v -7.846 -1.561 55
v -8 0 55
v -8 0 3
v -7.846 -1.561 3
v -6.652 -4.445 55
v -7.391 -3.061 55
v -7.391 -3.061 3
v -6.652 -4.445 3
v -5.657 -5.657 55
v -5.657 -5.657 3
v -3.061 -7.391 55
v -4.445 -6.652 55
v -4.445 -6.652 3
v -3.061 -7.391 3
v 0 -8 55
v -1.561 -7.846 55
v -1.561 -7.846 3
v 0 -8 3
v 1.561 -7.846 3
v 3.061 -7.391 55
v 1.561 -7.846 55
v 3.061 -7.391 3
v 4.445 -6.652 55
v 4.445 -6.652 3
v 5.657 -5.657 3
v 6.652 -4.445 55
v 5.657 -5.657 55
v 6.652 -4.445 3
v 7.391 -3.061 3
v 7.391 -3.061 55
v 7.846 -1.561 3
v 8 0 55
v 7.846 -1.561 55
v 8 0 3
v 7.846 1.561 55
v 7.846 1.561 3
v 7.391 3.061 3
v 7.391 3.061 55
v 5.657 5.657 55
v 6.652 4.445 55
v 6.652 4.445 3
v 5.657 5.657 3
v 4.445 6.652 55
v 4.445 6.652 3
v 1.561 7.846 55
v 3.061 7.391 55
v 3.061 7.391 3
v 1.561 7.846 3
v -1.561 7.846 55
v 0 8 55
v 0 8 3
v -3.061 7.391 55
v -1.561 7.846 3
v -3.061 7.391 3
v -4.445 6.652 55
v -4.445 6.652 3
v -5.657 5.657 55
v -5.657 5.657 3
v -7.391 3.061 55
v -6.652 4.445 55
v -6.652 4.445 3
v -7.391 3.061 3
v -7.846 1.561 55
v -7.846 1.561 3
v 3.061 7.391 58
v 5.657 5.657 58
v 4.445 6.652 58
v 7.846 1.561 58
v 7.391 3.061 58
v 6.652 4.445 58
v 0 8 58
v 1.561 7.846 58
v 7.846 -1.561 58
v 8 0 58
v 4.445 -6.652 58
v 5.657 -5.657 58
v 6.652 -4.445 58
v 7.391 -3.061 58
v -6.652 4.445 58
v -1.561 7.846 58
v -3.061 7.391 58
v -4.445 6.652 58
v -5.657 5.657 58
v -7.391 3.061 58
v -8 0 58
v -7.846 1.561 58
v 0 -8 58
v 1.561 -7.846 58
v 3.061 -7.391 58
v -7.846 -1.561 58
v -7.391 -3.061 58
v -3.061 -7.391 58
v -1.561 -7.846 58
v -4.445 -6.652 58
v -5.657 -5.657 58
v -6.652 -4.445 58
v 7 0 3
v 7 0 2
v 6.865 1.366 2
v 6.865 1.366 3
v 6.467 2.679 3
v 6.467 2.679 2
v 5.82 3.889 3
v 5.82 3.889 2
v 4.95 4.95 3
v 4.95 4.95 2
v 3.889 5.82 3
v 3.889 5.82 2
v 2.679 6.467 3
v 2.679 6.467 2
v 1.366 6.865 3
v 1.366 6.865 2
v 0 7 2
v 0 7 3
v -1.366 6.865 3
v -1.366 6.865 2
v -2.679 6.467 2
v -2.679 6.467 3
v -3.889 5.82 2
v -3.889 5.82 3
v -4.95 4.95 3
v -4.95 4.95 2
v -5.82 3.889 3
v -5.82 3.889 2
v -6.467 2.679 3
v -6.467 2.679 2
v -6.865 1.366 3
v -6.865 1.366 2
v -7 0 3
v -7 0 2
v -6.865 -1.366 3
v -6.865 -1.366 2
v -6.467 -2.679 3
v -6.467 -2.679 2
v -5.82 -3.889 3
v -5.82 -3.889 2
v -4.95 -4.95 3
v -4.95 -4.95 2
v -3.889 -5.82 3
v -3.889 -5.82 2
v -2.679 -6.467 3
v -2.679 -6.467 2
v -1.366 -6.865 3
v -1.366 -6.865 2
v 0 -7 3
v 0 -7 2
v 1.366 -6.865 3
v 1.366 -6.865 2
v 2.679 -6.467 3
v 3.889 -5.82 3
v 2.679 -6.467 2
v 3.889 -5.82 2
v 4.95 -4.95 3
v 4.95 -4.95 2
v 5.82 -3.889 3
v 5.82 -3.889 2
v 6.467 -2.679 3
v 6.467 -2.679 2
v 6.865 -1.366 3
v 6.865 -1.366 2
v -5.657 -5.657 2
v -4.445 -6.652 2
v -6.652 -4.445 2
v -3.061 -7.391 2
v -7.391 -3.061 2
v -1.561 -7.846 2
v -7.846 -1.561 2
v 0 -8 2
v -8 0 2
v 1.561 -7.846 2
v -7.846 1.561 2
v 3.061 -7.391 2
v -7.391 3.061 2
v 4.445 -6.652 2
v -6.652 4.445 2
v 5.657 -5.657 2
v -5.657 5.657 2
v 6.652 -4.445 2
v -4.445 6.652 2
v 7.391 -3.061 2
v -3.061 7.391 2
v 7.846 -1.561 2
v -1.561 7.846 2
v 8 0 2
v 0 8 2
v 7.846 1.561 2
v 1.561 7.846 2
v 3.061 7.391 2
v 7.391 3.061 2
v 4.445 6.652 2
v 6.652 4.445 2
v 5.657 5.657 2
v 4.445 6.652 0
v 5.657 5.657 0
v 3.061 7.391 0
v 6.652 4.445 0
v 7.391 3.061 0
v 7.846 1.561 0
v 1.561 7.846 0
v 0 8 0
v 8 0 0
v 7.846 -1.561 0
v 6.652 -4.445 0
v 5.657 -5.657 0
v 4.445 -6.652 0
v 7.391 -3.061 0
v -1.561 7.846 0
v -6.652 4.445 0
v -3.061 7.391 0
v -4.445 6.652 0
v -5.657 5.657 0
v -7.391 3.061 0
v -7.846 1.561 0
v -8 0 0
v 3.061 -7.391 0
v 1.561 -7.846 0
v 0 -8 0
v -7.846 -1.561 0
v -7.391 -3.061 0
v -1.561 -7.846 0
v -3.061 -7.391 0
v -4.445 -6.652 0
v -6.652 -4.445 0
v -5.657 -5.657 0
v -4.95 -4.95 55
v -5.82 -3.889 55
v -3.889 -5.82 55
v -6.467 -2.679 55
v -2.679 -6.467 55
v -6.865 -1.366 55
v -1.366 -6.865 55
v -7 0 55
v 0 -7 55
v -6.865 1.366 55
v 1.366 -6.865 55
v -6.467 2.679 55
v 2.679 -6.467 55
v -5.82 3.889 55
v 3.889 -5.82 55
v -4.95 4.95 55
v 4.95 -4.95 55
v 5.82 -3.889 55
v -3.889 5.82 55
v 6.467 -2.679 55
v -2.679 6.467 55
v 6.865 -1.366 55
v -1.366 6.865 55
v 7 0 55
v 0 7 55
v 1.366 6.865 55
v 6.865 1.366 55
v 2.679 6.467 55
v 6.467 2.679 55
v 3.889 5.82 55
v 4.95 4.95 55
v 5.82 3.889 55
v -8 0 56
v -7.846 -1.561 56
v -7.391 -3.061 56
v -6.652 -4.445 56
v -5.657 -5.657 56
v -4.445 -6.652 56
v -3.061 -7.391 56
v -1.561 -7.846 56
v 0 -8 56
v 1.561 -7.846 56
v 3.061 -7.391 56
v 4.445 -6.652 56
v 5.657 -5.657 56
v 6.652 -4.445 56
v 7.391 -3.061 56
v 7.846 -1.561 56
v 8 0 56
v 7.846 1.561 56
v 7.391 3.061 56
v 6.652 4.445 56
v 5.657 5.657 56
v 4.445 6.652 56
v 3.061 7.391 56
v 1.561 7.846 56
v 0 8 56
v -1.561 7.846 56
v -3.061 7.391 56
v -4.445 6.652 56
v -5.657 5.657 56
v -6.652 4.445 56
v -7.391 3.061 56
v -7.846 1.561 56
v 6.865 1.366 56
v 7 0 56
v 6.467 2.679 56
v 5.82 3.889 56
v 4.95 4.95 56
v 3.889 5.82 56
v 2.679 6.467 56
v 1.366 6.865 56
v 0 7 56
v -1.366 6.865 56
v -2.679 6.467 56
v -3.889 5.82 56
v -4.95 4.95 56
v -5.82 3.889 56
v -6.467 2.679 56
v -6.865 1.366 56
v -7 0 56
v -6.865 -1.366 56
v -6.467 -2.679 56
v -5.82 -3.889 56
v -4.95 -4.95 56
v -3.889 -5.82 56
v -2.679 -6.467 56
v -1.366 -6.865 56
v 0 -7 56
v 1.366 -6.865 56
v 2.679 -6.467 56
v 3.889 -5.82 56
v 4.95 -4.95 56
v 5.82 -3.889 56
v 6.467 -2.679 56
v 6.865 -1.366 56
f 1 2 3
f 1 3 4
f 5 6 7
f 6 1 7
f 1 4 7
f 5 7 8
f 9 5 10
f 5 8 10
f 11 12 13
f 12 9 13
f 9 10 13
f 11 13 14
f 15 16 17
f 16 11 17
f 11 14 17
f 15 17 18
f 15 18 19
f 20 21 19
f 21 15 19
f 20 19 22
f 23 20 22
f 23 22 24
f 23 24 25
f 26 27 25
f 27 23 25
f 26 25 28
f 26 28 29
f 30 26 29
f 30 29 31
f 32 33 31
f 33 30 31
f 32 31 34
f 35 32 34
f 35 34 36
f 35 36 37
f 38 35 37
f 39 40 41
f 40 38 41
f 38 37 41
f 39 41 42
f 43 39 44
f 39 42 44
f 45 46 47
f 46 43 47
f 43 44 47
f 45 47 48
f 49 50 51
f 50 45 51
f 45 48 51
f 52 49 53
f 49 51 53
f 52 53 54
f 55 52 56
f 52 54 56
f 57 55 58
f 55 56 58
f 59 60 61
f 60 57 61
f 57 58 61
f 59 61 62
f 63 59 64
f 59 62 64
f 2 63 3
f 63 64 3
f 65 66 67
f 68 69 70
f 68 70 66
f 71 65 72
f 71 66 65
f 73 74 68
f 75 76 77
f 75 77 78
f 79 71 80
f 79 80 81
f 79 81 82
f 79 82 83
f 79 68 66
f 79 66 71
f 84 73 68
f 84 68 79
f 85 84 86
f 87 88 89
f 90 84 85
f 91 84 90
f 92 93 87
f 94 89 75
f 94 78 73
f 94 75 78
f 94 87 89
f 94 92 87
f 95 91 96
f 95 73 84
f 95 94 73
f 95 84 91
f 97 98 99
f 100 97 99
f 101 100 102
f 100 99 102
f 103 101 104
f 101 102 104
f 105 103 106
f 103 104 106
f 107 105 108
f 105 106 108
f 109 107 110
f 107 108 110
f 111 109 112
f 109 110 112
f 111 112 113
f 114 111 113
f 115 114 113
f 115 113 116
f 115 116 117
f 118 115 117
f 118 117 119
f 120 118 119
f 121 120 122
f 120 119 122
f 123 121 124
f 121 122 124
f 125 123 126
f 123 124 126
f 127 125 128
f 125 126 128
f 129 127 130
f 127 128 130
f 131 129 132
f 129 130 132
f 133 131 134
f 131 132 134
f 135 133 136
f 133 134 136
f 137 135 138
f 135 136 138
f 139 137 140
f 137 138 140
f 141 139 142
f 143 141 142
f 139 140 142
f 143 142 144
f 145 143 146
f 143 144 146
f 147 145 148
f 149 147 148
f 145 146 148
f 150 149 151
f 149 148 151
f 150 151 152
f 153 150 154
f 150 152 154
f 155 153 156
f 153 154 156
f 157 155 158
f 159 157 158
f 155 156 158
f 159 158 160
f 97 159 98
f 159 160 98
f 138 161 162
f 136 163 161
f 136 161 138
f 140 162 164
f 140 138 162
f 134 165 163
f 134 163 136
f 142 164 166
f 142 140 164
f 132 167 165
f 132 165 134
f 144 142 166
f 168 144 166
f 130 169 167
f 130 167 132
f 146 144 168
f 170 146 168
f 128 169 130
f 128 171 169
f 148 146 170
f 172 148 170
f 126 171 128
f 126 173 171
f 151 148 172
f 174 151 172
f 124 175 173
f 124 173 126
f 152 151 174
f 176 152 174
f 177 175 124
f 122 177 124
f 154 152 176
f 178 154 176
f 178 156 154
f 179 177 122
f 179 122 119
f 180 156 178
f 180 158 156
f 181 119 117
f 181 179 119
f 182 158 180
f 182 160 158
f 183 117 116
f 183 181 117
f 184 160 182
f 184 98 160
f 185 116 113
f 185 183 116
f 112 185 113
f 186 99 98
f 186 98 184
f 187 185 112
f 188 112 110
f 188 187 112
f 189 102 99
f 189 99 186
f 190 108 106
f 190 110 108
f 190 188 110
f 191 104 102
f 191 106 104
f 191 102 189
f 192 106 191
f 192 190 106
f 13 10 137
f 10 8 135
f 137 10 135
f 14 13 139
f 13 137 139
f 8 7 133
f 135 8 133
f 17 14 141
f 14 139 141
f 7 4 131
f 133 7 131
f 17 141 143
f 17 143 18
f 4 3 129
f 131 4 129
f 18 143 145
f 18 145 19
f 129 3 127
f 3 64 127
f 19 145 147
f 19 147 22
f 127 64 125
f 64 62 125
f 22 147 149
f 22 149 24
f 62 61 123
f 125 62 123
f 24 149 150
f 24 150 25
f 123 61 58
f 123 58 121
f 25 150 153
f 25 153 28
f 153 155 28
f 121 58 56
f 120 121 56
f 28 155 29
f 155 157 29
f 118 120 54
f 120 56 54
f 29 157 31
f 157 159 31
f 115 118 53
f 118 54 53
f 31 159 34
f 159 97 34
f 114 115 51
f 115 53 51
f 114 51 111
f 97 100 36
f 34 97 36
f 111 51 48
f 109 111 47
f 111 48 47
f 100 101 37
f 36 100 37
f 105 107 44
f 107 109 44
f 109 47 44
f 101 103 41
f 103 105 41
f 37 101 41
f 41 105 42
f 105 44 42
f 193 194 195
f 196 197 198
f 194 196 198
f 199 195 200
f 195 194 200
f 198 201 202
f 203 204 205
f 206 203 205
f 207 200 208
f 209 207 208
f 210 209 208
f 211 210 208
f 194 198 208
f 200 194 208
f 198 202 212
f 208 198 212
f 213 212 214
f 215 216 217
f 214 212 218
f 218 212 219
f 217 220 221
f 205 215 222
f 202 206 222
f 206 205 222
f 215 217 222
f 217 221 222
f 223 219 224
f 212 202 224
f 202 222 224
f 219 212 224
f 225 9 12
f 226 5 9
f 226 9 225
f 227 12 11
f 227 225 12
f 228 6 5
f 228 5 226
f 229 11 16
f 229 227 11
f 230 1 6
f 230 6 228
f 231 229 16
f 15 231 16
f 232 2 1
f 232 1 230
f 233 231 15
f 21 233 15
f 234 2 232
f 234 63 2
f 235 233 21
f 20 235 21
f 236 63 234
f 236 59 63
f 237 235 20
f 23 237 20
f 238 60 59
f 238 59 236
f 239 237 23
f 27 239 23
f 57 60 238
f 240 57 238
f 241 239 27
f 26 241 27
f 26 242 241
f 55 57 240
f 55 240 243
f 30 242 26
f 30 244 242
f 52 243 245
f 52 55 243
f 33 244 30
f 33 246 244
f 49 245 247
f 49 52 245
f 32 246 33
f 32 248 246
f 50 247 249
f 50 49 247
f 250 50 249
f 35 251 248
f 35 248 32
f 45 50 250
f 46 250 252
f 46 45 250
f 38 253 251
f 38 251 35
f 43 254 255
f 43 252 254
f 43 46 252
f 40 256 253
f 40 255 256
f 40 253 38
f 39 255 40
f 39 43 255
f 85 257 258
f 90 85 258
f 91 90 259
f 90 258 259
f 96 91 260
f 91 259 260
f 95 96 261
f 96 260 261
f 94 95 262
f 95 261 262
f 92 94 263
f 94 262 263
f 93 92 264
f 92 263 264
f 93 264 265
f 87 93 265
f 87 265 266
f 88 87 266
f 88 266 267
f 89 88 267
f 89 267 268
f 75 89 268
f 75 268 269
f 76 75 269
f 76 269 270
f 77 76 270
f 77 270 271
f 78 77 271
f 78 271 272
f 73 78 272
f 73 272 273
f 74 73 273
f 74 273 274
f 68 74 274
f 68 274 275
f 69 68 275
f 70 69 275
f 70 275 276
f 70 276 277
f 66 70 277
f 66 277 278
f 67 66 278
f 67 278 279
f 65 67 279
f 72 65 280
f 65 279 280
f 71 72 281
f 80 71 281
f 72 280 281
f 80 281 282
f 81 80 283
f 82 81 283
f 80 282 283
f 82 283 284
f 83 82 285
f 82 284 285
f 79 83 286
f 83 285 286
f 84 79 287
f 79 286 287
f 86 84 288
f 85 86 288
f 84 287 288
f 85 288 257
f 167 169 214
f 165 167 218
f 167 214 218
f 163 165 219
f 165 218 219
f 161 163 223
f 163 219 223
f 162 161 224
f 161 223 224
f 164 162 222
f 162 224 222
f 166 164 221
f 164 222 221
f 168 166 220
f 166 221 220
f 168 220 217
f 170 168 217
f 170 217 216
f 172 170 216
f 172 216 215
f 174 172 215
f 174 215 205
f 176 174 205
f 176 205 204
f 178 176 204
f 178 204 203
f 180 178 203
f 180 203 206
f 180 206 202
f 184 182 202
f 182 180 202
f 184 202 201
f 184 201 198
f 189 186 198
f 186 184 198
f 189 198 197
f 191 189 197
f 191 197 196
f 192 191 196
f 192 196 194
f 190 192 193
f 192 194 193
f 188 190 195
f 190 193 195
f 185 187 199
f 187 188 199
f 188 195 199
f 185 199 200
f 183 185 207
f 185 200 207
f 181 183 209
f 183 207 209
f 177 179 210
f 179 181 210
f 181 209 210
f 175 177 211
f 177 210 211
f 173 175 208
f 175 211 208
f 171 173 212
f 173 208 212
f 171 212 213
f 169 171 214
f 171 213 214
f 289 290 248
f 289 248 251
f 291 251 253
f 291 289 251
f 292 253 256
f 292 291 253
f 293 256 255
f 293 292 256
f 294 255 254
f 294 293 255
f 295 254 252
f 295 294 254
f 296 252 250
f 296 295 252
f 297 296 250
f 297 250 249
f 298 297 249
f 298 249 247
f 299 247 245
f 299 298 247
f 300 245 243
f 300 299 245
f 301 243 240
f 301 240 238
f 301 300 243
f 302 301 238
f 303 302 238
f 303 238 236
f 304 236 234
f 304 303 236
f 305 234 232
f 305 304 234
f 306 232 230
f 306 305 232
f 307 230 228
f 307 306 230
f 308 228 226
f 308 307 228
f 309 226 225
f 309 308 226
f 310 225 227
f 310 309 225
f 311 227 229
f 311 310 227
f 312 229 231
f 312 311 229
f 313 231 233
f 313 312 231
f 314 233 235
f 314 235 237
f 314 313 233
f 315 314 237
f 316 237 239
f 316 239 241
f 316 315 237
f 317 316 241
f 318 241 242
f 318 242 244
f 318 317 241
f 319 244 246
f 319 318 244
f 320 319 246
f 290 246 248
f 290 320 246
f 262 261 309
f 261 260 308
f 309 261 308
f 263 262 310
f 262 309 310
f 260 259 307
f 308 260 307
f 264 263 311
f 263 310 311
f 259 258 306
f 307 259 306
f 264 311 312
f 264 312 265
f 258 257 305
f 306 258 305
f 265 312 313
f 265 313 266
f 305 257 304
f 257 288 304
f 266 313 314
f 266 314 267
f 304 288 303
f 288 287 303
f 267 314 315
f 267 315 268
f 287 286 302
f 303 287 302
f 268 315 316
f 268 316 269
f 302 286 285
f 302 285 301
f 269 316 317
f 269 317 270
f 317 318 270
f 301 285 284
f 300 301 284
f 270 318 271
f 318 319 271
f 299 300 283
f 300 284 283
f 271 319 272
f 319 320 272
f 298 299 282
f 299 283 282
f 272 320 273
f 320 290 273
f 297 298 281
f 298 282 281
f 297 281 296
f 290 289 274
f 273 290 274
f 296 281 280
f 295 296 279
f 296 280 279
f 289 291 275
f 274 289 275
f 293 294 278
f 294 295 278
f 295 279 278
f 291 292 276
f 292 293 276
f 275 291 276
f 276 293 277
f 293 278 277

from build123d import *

# Parameters (mm, degrees)
SKETCH1_R           = 8
BOSS_EXTRUDE1_DEPTH = 58
SKETCH2_OUTSIDE_W   = 30.452
SKETCH2_OUTSIDE_H   = 30.452
SKETCH2_OUTSIDE_R   = 7
CUT_EXTRUDE1_DEPTH  = 1


with BuildPart() as part:
    # Sketch1 → Boss-Extrude1 (new body)
    with BuildSketch(Plane.XY):
        with Locations(Location((0, 0, 0), (0, 0, 180))):
            Circle(SKETCH1_R)
    extrude(amount=BOSS_EXTRUDE1_DEPTH)

    # Sketch2 outside → Cut-Extrude1 (cut)
    with BuildSketch(Plane.XY.offset(56)):
        Rectangle(SKETCH2_OUTSIDE_W, SKETCH2_OUTSIDE_H)
        Circle(SKETCH2_OUTSIDE_R, mode=Mode.SUBTRACT)
    cut_extrude1 = extrude(amount=-CUT_EXTRUDE1_DEPTH, mode=Mode.SUBTRACT)

    # Mirror1: Cut-Extrude1 across plane
    add(cut_extrude1.mirror(Plane.XY.offset(29)), mode=Mode.SUBTRACT)


solid = part.part
